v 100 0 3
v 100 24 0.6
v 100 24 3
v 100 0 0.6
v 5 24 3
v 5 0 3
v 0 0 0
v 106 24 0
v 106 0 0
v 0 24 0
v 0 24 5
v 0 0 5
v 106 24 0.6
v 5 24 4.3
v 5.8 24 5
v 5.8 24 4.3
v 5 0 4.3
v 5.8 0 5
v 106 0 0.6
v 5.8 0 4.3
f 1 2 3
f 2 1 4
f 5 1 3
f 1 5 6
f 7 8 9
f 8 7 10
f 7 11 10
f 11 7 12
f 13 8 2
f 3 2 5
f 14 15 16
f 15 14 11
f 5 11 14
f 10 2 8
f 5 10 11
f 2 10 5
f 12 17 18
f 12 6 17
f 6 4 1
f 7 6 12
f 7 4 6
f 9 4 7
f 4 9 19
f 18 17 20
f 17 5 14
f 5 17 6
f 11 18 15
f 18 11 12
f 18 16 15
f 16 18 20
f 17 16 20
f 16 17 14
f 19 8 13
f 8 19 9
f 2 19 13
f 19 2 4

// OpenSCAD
/* Bag clip with living hinge - PETG, 0.4mm nozzle, no supports
   Printed open flat (single print, fuses into one piece), folds shut on 2mm folded bag.
   Two verification parts (lower + upper) that fuse at hinge when printed together.
   Assembly shows closed on bag, motion "closing" folds upper onto lower/bag.
*/
/* [Print] */
part = "lower"; // [lower, upper, assembly]

cadverify_only = "";
module instance(name, part, unit = 1) {
    echo(cadverify_instance = [name, part, unit]);
    if (cadverify_only == "" || cadverify_only == name) children();
}

// ---- parameters (mm) ----
arm_len = 100;
arm_w = 24;
arm_t = 3;
hinge_len = 6;
hinge_t = 0.6;
tab_len = 12;
heel_len = 8;
catch_w = 5;
lip = 0.8;
lip_t = 0.7;
bag_t = 2;

lower_xmax = 106;      // 0..106
upper_len_print = 112; // 0..112
closed_h = 8.2;
pivot_x = 103.05;
pivot_z = 4.1;

module lower_geo() {
    // base
    cube([100, arm_w, arm_t]);
    // catch block at free end (x 0..5), overlap into base
    translate([0, 0, 2.98]) cube([5, arm_w, 2.02]);
    // catch lip protruding +x, overlap into block
    translate([4.98, 0, 4.3]) cube([0.82, arm_w, 0.7]);
    // living hinge leaf, overlap into base
    translate([99.98, 0, 0]) cube([6.02, arm_w, hinge_t]);
}

module upper_geo() {
    // base 0..100
    cube([100, arm_w, arm_t]);
    // heel at hinge end on top
    translate([0, 0, 2.98]) cube([8, arm_w, 2.02]);
    // hook leg near free end on top
    translate([92.2, 0, 2.98]) cube([2, arm_w, 1.82]);
    // hook lip protruding +x from leg side
    translate([94.18, 0, 4.1]) cube([0.82, arm_w, 0.7]);
    // thumb tab extension beyond free end
    translate([99.98, 0, 0]) cube([12.02, arm_w, arm_t]);
}

module bag_geo() {
    translate([8, 0, 3]) cube([84, arm_w, bag_t]);
}

if (part == "lower") {
    echo(cadverify_spec = [
        ["bounds", [[0, 0, 0], [106, 24, 5]]],
        ["bodies", 1],
        ["through_holes", 0],
        ["support_faces", [["bed", "-z", 500]]],
        ["overhangs_allowed", [["catch lip bridge", [[4.5, 0, 4.0], [6.2, 24, 5.1]]]]],
        ["copies", 1],
        ["details", [
            ["base", "material", [[10, 0, 0], [90, 24, 3]], 1],
            ["catch", "material", [[0, 0, 3], [5, 24, 5]], 1],
            ["catch_lip", "material", [[5.0, 0.1, 4.35], [5.75, 23.9, 4.95]], 0.9],
            ["hinge", "material", [[100.05, 0.1, 0.05], [105.95, 23.9, 0.55]], 0.9],
            ["hook_space", "void", [[5.8, 0, 3], [8.6, 24, 5.4]], 1],
            ["bag_space", "void", [[8, 0, 5.1], [92, 24, 7]], 1],
            ["wall", "thickness", [50, 12, 6], [0, 0, -1], 3],
            ["film", "thickness", [103, 12, 2], [0, 0, -1], 0.6],
            ["hinge_top", "view", [[99, 0, 0], [107, 24, 1]]]
        ]]
    ]);
    lower_geo();
} else if (part == "upper") {
    echo(cadverify_spec = [
        ["bounds", [[0, 0, 0], [112, 24, 5]]],
        ["bodies", 1],
        ["through_holes", 0],
        ["support_faces", [["bed", "-z", 500]]],
        ["overhangs_allowed", [["hook lip bridge", [[91.5, 0, 2.8], [96, 24, 5]]]]],
        ["copies", 1],
        ["details", [
            ["heel", "material", [[0, 0, 3], [8, 24, 5]], 1],
            ["arm", "material", [[10, 0, 0], [80, 24, 3]], 1],
            ["hook_leg", "material", [[92.3, 0.1, 3.05], [94.1, 23.9, 4.75]], 0.9],
            ["hook_lip", "material", [[94.2, 0.1, 4.15], [94.95, 23.9, 4.75]], 0.9],
            ["tab", "material", [[100, 0, 0], [112, 24, 3]], 1],
            ["catch_space", "void", [[95, 0, 3], [99.9, 24, 5]], 1],
            ["wall", "thickness", [50, 12, 6], [0, 0, -1], 3],
            ["heel_wall", "thickness", [4, 12, 7], [0, 0, -1], 5],
            ["thumb", "view", [[99, 0, 0], [113, 24, 3.5]]]
        ]]
    ]);
    upper_geo();
} else if (part == "assembly") {
    echo(cadverify_spec = [
        ["bounds", [[0, 0, 0], [218, 24, 5]]],
        ["support_faces", [["bed", "-z", 1000]]],
        ["motions", [
            ["closing", ["upper"], "rotate", [103, 12, 4.1], [0, -1, 0], [0, 180],
                ["flex", [["upper", "lower", 1, "latch snap and heel clearance"]]], ["stops", [180]], ["rests", [180]]]
        ]],
        ["assembly_order", [
            [["lower"], [0, 0, 0]],
            [["bag"], [0, 0, -1]],
            [["upper"], [0, 0, -1], ["flex", [["upper", "lower", 1, "latch snap"]]]]
        ]]
    ]);
    instance("lower", "lower") lower_geo();
    instance("upper", "upper") translate([106, 0, 0]) upper_geo();
    instance("bag", "external") bag_geo();
}
